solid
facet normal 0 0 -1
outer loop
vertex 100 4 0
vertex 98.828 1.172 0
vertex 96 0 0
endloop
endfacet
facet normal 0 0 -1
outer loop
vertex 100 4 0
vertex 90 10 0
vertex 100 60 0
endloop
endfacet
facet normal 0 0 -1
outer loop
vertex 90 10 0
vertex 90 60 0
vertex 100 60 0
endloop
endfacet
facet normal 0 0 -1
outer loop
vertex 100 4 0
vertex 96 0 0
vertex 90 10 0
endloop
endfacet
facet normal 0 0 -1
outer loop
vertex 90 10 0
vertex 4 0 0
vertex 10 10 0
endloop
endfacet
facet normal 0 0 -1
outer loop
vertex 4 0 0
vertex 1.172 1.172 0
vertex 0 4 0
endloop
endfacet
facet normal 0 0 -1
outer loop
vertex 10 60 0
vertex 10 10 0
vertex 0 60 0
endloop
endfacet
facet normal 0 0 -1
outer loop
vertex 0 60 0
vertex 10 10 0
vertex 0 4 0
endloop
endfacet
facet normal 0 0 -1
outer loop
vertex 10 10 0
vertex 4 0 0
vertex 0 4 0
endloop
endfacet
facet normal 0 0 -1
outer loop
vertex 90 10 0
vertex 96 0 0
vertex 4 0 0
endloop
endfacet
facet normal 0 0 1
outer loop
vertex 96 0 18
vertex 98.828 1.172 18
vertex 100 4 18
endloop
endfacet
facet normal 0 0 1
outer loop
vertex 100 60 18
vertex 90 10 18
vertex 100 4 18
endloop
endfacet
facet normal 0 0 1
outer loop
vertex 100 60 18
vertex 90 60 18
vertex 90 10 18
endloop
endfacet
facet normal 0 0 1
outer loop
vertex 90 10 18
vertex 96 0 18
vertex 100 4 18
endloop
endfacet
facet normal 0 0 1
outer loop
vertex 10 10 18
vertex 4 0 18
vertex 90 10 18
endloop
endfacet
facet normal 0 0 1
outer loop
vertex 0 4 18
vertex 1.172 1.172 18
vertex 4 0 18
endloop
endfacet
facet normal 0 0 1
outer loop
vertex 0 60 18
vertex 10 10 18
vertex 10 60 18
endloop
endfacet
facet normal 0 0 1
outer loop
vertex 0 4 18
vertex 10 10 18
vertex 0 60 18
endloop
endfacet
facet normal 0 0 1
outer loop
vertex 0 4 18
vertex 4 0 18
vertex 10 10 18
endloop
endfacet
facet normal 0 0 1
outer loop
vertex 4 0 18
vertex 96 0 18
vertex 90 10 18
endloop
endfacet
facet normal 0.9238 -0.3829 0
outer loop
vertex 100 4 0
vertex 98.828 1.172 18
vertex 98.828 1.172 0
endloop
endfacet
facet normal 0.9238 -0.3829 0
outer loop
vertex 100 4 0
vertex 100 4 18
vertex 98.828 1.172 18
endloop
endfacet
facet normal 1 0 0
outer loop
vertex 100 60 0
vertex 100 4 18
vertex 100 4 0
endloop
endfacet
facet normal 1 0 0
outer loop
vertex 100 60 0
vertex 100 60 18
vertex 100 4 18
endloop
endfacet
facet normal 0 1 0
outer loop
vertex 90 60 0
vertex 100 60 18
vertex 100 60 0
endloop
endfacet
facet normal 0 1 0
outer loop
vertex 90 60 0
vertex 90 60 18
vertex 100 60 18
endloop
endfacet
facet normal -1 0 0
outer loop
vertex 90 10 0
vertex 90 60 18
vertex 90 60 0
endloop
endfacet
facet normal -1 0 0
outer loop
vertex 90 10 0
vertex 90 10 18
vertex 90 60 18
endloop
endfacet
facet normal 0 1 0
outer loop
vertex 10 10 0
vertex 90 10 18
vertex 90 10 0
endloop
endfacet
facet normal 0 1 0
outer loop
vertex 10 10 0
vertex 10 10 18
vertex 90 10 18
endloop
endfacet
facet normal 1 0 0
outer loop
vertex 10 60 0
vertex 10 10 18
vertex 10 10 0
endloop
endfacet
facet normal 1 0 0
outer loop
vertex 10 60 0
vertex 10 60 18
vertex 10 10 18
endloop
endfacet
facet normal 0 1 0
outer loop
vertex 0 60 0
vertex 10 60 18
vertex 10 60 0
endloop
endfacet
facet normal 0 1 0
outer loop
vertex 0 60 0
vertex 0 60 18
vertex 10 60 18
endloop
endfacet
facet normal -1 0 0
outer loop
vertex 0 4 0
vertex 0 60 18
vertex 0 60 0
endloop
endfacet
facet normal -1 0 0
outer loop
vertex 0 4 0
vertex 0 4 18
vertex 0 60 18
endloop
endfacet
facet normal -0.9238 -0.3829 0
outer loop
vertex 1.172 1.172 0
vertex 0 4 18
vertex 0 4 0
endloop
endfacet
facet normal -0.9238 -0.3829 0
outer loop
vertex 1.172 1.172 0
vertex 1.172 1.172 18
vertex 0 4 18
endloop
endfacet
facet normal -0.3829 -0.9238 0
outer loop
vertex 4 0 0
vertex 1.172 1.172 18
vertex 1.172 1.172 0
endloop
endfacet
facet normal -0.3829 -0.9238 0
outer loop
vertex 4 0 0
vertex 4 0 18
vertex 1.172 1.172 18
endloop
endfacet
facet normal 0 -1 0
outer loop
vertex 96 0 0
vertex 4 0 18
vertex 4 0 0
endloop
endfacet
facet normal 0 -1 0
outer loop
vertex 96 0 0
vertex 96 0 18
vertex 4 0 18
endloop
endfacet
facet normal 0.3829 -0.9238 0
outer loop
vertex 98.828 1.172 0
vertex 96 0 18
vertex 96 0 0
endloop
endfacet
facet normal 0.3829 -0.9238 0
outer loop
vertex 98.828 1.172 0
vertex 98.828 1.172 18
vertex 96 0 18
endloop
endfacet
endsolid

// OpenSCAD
$fn = 32;

// ----------------------------------------------------------------------
// Heat sink frame: 100 x 60 mm frame, 10 mm walls
// ----------------------------------------------------------------------

// --- parameters (mm) ---
profile_height = 18;      // extrusion height
profile_points = 12;      // points of the closed outline

profile = [[0, 4], [1.172, 1.172], [4, 0], [96, 0], [98.828, 1.172], [100, 4], [100, 60], [90, 60], [90, 10], [10, 10], [10, 60], [0, 60]];  // single closed polygon, 12 points, counter clockwise

// --- the one profile operation ---
linear_extrude(height = profile_height) polygon(points = profile);
